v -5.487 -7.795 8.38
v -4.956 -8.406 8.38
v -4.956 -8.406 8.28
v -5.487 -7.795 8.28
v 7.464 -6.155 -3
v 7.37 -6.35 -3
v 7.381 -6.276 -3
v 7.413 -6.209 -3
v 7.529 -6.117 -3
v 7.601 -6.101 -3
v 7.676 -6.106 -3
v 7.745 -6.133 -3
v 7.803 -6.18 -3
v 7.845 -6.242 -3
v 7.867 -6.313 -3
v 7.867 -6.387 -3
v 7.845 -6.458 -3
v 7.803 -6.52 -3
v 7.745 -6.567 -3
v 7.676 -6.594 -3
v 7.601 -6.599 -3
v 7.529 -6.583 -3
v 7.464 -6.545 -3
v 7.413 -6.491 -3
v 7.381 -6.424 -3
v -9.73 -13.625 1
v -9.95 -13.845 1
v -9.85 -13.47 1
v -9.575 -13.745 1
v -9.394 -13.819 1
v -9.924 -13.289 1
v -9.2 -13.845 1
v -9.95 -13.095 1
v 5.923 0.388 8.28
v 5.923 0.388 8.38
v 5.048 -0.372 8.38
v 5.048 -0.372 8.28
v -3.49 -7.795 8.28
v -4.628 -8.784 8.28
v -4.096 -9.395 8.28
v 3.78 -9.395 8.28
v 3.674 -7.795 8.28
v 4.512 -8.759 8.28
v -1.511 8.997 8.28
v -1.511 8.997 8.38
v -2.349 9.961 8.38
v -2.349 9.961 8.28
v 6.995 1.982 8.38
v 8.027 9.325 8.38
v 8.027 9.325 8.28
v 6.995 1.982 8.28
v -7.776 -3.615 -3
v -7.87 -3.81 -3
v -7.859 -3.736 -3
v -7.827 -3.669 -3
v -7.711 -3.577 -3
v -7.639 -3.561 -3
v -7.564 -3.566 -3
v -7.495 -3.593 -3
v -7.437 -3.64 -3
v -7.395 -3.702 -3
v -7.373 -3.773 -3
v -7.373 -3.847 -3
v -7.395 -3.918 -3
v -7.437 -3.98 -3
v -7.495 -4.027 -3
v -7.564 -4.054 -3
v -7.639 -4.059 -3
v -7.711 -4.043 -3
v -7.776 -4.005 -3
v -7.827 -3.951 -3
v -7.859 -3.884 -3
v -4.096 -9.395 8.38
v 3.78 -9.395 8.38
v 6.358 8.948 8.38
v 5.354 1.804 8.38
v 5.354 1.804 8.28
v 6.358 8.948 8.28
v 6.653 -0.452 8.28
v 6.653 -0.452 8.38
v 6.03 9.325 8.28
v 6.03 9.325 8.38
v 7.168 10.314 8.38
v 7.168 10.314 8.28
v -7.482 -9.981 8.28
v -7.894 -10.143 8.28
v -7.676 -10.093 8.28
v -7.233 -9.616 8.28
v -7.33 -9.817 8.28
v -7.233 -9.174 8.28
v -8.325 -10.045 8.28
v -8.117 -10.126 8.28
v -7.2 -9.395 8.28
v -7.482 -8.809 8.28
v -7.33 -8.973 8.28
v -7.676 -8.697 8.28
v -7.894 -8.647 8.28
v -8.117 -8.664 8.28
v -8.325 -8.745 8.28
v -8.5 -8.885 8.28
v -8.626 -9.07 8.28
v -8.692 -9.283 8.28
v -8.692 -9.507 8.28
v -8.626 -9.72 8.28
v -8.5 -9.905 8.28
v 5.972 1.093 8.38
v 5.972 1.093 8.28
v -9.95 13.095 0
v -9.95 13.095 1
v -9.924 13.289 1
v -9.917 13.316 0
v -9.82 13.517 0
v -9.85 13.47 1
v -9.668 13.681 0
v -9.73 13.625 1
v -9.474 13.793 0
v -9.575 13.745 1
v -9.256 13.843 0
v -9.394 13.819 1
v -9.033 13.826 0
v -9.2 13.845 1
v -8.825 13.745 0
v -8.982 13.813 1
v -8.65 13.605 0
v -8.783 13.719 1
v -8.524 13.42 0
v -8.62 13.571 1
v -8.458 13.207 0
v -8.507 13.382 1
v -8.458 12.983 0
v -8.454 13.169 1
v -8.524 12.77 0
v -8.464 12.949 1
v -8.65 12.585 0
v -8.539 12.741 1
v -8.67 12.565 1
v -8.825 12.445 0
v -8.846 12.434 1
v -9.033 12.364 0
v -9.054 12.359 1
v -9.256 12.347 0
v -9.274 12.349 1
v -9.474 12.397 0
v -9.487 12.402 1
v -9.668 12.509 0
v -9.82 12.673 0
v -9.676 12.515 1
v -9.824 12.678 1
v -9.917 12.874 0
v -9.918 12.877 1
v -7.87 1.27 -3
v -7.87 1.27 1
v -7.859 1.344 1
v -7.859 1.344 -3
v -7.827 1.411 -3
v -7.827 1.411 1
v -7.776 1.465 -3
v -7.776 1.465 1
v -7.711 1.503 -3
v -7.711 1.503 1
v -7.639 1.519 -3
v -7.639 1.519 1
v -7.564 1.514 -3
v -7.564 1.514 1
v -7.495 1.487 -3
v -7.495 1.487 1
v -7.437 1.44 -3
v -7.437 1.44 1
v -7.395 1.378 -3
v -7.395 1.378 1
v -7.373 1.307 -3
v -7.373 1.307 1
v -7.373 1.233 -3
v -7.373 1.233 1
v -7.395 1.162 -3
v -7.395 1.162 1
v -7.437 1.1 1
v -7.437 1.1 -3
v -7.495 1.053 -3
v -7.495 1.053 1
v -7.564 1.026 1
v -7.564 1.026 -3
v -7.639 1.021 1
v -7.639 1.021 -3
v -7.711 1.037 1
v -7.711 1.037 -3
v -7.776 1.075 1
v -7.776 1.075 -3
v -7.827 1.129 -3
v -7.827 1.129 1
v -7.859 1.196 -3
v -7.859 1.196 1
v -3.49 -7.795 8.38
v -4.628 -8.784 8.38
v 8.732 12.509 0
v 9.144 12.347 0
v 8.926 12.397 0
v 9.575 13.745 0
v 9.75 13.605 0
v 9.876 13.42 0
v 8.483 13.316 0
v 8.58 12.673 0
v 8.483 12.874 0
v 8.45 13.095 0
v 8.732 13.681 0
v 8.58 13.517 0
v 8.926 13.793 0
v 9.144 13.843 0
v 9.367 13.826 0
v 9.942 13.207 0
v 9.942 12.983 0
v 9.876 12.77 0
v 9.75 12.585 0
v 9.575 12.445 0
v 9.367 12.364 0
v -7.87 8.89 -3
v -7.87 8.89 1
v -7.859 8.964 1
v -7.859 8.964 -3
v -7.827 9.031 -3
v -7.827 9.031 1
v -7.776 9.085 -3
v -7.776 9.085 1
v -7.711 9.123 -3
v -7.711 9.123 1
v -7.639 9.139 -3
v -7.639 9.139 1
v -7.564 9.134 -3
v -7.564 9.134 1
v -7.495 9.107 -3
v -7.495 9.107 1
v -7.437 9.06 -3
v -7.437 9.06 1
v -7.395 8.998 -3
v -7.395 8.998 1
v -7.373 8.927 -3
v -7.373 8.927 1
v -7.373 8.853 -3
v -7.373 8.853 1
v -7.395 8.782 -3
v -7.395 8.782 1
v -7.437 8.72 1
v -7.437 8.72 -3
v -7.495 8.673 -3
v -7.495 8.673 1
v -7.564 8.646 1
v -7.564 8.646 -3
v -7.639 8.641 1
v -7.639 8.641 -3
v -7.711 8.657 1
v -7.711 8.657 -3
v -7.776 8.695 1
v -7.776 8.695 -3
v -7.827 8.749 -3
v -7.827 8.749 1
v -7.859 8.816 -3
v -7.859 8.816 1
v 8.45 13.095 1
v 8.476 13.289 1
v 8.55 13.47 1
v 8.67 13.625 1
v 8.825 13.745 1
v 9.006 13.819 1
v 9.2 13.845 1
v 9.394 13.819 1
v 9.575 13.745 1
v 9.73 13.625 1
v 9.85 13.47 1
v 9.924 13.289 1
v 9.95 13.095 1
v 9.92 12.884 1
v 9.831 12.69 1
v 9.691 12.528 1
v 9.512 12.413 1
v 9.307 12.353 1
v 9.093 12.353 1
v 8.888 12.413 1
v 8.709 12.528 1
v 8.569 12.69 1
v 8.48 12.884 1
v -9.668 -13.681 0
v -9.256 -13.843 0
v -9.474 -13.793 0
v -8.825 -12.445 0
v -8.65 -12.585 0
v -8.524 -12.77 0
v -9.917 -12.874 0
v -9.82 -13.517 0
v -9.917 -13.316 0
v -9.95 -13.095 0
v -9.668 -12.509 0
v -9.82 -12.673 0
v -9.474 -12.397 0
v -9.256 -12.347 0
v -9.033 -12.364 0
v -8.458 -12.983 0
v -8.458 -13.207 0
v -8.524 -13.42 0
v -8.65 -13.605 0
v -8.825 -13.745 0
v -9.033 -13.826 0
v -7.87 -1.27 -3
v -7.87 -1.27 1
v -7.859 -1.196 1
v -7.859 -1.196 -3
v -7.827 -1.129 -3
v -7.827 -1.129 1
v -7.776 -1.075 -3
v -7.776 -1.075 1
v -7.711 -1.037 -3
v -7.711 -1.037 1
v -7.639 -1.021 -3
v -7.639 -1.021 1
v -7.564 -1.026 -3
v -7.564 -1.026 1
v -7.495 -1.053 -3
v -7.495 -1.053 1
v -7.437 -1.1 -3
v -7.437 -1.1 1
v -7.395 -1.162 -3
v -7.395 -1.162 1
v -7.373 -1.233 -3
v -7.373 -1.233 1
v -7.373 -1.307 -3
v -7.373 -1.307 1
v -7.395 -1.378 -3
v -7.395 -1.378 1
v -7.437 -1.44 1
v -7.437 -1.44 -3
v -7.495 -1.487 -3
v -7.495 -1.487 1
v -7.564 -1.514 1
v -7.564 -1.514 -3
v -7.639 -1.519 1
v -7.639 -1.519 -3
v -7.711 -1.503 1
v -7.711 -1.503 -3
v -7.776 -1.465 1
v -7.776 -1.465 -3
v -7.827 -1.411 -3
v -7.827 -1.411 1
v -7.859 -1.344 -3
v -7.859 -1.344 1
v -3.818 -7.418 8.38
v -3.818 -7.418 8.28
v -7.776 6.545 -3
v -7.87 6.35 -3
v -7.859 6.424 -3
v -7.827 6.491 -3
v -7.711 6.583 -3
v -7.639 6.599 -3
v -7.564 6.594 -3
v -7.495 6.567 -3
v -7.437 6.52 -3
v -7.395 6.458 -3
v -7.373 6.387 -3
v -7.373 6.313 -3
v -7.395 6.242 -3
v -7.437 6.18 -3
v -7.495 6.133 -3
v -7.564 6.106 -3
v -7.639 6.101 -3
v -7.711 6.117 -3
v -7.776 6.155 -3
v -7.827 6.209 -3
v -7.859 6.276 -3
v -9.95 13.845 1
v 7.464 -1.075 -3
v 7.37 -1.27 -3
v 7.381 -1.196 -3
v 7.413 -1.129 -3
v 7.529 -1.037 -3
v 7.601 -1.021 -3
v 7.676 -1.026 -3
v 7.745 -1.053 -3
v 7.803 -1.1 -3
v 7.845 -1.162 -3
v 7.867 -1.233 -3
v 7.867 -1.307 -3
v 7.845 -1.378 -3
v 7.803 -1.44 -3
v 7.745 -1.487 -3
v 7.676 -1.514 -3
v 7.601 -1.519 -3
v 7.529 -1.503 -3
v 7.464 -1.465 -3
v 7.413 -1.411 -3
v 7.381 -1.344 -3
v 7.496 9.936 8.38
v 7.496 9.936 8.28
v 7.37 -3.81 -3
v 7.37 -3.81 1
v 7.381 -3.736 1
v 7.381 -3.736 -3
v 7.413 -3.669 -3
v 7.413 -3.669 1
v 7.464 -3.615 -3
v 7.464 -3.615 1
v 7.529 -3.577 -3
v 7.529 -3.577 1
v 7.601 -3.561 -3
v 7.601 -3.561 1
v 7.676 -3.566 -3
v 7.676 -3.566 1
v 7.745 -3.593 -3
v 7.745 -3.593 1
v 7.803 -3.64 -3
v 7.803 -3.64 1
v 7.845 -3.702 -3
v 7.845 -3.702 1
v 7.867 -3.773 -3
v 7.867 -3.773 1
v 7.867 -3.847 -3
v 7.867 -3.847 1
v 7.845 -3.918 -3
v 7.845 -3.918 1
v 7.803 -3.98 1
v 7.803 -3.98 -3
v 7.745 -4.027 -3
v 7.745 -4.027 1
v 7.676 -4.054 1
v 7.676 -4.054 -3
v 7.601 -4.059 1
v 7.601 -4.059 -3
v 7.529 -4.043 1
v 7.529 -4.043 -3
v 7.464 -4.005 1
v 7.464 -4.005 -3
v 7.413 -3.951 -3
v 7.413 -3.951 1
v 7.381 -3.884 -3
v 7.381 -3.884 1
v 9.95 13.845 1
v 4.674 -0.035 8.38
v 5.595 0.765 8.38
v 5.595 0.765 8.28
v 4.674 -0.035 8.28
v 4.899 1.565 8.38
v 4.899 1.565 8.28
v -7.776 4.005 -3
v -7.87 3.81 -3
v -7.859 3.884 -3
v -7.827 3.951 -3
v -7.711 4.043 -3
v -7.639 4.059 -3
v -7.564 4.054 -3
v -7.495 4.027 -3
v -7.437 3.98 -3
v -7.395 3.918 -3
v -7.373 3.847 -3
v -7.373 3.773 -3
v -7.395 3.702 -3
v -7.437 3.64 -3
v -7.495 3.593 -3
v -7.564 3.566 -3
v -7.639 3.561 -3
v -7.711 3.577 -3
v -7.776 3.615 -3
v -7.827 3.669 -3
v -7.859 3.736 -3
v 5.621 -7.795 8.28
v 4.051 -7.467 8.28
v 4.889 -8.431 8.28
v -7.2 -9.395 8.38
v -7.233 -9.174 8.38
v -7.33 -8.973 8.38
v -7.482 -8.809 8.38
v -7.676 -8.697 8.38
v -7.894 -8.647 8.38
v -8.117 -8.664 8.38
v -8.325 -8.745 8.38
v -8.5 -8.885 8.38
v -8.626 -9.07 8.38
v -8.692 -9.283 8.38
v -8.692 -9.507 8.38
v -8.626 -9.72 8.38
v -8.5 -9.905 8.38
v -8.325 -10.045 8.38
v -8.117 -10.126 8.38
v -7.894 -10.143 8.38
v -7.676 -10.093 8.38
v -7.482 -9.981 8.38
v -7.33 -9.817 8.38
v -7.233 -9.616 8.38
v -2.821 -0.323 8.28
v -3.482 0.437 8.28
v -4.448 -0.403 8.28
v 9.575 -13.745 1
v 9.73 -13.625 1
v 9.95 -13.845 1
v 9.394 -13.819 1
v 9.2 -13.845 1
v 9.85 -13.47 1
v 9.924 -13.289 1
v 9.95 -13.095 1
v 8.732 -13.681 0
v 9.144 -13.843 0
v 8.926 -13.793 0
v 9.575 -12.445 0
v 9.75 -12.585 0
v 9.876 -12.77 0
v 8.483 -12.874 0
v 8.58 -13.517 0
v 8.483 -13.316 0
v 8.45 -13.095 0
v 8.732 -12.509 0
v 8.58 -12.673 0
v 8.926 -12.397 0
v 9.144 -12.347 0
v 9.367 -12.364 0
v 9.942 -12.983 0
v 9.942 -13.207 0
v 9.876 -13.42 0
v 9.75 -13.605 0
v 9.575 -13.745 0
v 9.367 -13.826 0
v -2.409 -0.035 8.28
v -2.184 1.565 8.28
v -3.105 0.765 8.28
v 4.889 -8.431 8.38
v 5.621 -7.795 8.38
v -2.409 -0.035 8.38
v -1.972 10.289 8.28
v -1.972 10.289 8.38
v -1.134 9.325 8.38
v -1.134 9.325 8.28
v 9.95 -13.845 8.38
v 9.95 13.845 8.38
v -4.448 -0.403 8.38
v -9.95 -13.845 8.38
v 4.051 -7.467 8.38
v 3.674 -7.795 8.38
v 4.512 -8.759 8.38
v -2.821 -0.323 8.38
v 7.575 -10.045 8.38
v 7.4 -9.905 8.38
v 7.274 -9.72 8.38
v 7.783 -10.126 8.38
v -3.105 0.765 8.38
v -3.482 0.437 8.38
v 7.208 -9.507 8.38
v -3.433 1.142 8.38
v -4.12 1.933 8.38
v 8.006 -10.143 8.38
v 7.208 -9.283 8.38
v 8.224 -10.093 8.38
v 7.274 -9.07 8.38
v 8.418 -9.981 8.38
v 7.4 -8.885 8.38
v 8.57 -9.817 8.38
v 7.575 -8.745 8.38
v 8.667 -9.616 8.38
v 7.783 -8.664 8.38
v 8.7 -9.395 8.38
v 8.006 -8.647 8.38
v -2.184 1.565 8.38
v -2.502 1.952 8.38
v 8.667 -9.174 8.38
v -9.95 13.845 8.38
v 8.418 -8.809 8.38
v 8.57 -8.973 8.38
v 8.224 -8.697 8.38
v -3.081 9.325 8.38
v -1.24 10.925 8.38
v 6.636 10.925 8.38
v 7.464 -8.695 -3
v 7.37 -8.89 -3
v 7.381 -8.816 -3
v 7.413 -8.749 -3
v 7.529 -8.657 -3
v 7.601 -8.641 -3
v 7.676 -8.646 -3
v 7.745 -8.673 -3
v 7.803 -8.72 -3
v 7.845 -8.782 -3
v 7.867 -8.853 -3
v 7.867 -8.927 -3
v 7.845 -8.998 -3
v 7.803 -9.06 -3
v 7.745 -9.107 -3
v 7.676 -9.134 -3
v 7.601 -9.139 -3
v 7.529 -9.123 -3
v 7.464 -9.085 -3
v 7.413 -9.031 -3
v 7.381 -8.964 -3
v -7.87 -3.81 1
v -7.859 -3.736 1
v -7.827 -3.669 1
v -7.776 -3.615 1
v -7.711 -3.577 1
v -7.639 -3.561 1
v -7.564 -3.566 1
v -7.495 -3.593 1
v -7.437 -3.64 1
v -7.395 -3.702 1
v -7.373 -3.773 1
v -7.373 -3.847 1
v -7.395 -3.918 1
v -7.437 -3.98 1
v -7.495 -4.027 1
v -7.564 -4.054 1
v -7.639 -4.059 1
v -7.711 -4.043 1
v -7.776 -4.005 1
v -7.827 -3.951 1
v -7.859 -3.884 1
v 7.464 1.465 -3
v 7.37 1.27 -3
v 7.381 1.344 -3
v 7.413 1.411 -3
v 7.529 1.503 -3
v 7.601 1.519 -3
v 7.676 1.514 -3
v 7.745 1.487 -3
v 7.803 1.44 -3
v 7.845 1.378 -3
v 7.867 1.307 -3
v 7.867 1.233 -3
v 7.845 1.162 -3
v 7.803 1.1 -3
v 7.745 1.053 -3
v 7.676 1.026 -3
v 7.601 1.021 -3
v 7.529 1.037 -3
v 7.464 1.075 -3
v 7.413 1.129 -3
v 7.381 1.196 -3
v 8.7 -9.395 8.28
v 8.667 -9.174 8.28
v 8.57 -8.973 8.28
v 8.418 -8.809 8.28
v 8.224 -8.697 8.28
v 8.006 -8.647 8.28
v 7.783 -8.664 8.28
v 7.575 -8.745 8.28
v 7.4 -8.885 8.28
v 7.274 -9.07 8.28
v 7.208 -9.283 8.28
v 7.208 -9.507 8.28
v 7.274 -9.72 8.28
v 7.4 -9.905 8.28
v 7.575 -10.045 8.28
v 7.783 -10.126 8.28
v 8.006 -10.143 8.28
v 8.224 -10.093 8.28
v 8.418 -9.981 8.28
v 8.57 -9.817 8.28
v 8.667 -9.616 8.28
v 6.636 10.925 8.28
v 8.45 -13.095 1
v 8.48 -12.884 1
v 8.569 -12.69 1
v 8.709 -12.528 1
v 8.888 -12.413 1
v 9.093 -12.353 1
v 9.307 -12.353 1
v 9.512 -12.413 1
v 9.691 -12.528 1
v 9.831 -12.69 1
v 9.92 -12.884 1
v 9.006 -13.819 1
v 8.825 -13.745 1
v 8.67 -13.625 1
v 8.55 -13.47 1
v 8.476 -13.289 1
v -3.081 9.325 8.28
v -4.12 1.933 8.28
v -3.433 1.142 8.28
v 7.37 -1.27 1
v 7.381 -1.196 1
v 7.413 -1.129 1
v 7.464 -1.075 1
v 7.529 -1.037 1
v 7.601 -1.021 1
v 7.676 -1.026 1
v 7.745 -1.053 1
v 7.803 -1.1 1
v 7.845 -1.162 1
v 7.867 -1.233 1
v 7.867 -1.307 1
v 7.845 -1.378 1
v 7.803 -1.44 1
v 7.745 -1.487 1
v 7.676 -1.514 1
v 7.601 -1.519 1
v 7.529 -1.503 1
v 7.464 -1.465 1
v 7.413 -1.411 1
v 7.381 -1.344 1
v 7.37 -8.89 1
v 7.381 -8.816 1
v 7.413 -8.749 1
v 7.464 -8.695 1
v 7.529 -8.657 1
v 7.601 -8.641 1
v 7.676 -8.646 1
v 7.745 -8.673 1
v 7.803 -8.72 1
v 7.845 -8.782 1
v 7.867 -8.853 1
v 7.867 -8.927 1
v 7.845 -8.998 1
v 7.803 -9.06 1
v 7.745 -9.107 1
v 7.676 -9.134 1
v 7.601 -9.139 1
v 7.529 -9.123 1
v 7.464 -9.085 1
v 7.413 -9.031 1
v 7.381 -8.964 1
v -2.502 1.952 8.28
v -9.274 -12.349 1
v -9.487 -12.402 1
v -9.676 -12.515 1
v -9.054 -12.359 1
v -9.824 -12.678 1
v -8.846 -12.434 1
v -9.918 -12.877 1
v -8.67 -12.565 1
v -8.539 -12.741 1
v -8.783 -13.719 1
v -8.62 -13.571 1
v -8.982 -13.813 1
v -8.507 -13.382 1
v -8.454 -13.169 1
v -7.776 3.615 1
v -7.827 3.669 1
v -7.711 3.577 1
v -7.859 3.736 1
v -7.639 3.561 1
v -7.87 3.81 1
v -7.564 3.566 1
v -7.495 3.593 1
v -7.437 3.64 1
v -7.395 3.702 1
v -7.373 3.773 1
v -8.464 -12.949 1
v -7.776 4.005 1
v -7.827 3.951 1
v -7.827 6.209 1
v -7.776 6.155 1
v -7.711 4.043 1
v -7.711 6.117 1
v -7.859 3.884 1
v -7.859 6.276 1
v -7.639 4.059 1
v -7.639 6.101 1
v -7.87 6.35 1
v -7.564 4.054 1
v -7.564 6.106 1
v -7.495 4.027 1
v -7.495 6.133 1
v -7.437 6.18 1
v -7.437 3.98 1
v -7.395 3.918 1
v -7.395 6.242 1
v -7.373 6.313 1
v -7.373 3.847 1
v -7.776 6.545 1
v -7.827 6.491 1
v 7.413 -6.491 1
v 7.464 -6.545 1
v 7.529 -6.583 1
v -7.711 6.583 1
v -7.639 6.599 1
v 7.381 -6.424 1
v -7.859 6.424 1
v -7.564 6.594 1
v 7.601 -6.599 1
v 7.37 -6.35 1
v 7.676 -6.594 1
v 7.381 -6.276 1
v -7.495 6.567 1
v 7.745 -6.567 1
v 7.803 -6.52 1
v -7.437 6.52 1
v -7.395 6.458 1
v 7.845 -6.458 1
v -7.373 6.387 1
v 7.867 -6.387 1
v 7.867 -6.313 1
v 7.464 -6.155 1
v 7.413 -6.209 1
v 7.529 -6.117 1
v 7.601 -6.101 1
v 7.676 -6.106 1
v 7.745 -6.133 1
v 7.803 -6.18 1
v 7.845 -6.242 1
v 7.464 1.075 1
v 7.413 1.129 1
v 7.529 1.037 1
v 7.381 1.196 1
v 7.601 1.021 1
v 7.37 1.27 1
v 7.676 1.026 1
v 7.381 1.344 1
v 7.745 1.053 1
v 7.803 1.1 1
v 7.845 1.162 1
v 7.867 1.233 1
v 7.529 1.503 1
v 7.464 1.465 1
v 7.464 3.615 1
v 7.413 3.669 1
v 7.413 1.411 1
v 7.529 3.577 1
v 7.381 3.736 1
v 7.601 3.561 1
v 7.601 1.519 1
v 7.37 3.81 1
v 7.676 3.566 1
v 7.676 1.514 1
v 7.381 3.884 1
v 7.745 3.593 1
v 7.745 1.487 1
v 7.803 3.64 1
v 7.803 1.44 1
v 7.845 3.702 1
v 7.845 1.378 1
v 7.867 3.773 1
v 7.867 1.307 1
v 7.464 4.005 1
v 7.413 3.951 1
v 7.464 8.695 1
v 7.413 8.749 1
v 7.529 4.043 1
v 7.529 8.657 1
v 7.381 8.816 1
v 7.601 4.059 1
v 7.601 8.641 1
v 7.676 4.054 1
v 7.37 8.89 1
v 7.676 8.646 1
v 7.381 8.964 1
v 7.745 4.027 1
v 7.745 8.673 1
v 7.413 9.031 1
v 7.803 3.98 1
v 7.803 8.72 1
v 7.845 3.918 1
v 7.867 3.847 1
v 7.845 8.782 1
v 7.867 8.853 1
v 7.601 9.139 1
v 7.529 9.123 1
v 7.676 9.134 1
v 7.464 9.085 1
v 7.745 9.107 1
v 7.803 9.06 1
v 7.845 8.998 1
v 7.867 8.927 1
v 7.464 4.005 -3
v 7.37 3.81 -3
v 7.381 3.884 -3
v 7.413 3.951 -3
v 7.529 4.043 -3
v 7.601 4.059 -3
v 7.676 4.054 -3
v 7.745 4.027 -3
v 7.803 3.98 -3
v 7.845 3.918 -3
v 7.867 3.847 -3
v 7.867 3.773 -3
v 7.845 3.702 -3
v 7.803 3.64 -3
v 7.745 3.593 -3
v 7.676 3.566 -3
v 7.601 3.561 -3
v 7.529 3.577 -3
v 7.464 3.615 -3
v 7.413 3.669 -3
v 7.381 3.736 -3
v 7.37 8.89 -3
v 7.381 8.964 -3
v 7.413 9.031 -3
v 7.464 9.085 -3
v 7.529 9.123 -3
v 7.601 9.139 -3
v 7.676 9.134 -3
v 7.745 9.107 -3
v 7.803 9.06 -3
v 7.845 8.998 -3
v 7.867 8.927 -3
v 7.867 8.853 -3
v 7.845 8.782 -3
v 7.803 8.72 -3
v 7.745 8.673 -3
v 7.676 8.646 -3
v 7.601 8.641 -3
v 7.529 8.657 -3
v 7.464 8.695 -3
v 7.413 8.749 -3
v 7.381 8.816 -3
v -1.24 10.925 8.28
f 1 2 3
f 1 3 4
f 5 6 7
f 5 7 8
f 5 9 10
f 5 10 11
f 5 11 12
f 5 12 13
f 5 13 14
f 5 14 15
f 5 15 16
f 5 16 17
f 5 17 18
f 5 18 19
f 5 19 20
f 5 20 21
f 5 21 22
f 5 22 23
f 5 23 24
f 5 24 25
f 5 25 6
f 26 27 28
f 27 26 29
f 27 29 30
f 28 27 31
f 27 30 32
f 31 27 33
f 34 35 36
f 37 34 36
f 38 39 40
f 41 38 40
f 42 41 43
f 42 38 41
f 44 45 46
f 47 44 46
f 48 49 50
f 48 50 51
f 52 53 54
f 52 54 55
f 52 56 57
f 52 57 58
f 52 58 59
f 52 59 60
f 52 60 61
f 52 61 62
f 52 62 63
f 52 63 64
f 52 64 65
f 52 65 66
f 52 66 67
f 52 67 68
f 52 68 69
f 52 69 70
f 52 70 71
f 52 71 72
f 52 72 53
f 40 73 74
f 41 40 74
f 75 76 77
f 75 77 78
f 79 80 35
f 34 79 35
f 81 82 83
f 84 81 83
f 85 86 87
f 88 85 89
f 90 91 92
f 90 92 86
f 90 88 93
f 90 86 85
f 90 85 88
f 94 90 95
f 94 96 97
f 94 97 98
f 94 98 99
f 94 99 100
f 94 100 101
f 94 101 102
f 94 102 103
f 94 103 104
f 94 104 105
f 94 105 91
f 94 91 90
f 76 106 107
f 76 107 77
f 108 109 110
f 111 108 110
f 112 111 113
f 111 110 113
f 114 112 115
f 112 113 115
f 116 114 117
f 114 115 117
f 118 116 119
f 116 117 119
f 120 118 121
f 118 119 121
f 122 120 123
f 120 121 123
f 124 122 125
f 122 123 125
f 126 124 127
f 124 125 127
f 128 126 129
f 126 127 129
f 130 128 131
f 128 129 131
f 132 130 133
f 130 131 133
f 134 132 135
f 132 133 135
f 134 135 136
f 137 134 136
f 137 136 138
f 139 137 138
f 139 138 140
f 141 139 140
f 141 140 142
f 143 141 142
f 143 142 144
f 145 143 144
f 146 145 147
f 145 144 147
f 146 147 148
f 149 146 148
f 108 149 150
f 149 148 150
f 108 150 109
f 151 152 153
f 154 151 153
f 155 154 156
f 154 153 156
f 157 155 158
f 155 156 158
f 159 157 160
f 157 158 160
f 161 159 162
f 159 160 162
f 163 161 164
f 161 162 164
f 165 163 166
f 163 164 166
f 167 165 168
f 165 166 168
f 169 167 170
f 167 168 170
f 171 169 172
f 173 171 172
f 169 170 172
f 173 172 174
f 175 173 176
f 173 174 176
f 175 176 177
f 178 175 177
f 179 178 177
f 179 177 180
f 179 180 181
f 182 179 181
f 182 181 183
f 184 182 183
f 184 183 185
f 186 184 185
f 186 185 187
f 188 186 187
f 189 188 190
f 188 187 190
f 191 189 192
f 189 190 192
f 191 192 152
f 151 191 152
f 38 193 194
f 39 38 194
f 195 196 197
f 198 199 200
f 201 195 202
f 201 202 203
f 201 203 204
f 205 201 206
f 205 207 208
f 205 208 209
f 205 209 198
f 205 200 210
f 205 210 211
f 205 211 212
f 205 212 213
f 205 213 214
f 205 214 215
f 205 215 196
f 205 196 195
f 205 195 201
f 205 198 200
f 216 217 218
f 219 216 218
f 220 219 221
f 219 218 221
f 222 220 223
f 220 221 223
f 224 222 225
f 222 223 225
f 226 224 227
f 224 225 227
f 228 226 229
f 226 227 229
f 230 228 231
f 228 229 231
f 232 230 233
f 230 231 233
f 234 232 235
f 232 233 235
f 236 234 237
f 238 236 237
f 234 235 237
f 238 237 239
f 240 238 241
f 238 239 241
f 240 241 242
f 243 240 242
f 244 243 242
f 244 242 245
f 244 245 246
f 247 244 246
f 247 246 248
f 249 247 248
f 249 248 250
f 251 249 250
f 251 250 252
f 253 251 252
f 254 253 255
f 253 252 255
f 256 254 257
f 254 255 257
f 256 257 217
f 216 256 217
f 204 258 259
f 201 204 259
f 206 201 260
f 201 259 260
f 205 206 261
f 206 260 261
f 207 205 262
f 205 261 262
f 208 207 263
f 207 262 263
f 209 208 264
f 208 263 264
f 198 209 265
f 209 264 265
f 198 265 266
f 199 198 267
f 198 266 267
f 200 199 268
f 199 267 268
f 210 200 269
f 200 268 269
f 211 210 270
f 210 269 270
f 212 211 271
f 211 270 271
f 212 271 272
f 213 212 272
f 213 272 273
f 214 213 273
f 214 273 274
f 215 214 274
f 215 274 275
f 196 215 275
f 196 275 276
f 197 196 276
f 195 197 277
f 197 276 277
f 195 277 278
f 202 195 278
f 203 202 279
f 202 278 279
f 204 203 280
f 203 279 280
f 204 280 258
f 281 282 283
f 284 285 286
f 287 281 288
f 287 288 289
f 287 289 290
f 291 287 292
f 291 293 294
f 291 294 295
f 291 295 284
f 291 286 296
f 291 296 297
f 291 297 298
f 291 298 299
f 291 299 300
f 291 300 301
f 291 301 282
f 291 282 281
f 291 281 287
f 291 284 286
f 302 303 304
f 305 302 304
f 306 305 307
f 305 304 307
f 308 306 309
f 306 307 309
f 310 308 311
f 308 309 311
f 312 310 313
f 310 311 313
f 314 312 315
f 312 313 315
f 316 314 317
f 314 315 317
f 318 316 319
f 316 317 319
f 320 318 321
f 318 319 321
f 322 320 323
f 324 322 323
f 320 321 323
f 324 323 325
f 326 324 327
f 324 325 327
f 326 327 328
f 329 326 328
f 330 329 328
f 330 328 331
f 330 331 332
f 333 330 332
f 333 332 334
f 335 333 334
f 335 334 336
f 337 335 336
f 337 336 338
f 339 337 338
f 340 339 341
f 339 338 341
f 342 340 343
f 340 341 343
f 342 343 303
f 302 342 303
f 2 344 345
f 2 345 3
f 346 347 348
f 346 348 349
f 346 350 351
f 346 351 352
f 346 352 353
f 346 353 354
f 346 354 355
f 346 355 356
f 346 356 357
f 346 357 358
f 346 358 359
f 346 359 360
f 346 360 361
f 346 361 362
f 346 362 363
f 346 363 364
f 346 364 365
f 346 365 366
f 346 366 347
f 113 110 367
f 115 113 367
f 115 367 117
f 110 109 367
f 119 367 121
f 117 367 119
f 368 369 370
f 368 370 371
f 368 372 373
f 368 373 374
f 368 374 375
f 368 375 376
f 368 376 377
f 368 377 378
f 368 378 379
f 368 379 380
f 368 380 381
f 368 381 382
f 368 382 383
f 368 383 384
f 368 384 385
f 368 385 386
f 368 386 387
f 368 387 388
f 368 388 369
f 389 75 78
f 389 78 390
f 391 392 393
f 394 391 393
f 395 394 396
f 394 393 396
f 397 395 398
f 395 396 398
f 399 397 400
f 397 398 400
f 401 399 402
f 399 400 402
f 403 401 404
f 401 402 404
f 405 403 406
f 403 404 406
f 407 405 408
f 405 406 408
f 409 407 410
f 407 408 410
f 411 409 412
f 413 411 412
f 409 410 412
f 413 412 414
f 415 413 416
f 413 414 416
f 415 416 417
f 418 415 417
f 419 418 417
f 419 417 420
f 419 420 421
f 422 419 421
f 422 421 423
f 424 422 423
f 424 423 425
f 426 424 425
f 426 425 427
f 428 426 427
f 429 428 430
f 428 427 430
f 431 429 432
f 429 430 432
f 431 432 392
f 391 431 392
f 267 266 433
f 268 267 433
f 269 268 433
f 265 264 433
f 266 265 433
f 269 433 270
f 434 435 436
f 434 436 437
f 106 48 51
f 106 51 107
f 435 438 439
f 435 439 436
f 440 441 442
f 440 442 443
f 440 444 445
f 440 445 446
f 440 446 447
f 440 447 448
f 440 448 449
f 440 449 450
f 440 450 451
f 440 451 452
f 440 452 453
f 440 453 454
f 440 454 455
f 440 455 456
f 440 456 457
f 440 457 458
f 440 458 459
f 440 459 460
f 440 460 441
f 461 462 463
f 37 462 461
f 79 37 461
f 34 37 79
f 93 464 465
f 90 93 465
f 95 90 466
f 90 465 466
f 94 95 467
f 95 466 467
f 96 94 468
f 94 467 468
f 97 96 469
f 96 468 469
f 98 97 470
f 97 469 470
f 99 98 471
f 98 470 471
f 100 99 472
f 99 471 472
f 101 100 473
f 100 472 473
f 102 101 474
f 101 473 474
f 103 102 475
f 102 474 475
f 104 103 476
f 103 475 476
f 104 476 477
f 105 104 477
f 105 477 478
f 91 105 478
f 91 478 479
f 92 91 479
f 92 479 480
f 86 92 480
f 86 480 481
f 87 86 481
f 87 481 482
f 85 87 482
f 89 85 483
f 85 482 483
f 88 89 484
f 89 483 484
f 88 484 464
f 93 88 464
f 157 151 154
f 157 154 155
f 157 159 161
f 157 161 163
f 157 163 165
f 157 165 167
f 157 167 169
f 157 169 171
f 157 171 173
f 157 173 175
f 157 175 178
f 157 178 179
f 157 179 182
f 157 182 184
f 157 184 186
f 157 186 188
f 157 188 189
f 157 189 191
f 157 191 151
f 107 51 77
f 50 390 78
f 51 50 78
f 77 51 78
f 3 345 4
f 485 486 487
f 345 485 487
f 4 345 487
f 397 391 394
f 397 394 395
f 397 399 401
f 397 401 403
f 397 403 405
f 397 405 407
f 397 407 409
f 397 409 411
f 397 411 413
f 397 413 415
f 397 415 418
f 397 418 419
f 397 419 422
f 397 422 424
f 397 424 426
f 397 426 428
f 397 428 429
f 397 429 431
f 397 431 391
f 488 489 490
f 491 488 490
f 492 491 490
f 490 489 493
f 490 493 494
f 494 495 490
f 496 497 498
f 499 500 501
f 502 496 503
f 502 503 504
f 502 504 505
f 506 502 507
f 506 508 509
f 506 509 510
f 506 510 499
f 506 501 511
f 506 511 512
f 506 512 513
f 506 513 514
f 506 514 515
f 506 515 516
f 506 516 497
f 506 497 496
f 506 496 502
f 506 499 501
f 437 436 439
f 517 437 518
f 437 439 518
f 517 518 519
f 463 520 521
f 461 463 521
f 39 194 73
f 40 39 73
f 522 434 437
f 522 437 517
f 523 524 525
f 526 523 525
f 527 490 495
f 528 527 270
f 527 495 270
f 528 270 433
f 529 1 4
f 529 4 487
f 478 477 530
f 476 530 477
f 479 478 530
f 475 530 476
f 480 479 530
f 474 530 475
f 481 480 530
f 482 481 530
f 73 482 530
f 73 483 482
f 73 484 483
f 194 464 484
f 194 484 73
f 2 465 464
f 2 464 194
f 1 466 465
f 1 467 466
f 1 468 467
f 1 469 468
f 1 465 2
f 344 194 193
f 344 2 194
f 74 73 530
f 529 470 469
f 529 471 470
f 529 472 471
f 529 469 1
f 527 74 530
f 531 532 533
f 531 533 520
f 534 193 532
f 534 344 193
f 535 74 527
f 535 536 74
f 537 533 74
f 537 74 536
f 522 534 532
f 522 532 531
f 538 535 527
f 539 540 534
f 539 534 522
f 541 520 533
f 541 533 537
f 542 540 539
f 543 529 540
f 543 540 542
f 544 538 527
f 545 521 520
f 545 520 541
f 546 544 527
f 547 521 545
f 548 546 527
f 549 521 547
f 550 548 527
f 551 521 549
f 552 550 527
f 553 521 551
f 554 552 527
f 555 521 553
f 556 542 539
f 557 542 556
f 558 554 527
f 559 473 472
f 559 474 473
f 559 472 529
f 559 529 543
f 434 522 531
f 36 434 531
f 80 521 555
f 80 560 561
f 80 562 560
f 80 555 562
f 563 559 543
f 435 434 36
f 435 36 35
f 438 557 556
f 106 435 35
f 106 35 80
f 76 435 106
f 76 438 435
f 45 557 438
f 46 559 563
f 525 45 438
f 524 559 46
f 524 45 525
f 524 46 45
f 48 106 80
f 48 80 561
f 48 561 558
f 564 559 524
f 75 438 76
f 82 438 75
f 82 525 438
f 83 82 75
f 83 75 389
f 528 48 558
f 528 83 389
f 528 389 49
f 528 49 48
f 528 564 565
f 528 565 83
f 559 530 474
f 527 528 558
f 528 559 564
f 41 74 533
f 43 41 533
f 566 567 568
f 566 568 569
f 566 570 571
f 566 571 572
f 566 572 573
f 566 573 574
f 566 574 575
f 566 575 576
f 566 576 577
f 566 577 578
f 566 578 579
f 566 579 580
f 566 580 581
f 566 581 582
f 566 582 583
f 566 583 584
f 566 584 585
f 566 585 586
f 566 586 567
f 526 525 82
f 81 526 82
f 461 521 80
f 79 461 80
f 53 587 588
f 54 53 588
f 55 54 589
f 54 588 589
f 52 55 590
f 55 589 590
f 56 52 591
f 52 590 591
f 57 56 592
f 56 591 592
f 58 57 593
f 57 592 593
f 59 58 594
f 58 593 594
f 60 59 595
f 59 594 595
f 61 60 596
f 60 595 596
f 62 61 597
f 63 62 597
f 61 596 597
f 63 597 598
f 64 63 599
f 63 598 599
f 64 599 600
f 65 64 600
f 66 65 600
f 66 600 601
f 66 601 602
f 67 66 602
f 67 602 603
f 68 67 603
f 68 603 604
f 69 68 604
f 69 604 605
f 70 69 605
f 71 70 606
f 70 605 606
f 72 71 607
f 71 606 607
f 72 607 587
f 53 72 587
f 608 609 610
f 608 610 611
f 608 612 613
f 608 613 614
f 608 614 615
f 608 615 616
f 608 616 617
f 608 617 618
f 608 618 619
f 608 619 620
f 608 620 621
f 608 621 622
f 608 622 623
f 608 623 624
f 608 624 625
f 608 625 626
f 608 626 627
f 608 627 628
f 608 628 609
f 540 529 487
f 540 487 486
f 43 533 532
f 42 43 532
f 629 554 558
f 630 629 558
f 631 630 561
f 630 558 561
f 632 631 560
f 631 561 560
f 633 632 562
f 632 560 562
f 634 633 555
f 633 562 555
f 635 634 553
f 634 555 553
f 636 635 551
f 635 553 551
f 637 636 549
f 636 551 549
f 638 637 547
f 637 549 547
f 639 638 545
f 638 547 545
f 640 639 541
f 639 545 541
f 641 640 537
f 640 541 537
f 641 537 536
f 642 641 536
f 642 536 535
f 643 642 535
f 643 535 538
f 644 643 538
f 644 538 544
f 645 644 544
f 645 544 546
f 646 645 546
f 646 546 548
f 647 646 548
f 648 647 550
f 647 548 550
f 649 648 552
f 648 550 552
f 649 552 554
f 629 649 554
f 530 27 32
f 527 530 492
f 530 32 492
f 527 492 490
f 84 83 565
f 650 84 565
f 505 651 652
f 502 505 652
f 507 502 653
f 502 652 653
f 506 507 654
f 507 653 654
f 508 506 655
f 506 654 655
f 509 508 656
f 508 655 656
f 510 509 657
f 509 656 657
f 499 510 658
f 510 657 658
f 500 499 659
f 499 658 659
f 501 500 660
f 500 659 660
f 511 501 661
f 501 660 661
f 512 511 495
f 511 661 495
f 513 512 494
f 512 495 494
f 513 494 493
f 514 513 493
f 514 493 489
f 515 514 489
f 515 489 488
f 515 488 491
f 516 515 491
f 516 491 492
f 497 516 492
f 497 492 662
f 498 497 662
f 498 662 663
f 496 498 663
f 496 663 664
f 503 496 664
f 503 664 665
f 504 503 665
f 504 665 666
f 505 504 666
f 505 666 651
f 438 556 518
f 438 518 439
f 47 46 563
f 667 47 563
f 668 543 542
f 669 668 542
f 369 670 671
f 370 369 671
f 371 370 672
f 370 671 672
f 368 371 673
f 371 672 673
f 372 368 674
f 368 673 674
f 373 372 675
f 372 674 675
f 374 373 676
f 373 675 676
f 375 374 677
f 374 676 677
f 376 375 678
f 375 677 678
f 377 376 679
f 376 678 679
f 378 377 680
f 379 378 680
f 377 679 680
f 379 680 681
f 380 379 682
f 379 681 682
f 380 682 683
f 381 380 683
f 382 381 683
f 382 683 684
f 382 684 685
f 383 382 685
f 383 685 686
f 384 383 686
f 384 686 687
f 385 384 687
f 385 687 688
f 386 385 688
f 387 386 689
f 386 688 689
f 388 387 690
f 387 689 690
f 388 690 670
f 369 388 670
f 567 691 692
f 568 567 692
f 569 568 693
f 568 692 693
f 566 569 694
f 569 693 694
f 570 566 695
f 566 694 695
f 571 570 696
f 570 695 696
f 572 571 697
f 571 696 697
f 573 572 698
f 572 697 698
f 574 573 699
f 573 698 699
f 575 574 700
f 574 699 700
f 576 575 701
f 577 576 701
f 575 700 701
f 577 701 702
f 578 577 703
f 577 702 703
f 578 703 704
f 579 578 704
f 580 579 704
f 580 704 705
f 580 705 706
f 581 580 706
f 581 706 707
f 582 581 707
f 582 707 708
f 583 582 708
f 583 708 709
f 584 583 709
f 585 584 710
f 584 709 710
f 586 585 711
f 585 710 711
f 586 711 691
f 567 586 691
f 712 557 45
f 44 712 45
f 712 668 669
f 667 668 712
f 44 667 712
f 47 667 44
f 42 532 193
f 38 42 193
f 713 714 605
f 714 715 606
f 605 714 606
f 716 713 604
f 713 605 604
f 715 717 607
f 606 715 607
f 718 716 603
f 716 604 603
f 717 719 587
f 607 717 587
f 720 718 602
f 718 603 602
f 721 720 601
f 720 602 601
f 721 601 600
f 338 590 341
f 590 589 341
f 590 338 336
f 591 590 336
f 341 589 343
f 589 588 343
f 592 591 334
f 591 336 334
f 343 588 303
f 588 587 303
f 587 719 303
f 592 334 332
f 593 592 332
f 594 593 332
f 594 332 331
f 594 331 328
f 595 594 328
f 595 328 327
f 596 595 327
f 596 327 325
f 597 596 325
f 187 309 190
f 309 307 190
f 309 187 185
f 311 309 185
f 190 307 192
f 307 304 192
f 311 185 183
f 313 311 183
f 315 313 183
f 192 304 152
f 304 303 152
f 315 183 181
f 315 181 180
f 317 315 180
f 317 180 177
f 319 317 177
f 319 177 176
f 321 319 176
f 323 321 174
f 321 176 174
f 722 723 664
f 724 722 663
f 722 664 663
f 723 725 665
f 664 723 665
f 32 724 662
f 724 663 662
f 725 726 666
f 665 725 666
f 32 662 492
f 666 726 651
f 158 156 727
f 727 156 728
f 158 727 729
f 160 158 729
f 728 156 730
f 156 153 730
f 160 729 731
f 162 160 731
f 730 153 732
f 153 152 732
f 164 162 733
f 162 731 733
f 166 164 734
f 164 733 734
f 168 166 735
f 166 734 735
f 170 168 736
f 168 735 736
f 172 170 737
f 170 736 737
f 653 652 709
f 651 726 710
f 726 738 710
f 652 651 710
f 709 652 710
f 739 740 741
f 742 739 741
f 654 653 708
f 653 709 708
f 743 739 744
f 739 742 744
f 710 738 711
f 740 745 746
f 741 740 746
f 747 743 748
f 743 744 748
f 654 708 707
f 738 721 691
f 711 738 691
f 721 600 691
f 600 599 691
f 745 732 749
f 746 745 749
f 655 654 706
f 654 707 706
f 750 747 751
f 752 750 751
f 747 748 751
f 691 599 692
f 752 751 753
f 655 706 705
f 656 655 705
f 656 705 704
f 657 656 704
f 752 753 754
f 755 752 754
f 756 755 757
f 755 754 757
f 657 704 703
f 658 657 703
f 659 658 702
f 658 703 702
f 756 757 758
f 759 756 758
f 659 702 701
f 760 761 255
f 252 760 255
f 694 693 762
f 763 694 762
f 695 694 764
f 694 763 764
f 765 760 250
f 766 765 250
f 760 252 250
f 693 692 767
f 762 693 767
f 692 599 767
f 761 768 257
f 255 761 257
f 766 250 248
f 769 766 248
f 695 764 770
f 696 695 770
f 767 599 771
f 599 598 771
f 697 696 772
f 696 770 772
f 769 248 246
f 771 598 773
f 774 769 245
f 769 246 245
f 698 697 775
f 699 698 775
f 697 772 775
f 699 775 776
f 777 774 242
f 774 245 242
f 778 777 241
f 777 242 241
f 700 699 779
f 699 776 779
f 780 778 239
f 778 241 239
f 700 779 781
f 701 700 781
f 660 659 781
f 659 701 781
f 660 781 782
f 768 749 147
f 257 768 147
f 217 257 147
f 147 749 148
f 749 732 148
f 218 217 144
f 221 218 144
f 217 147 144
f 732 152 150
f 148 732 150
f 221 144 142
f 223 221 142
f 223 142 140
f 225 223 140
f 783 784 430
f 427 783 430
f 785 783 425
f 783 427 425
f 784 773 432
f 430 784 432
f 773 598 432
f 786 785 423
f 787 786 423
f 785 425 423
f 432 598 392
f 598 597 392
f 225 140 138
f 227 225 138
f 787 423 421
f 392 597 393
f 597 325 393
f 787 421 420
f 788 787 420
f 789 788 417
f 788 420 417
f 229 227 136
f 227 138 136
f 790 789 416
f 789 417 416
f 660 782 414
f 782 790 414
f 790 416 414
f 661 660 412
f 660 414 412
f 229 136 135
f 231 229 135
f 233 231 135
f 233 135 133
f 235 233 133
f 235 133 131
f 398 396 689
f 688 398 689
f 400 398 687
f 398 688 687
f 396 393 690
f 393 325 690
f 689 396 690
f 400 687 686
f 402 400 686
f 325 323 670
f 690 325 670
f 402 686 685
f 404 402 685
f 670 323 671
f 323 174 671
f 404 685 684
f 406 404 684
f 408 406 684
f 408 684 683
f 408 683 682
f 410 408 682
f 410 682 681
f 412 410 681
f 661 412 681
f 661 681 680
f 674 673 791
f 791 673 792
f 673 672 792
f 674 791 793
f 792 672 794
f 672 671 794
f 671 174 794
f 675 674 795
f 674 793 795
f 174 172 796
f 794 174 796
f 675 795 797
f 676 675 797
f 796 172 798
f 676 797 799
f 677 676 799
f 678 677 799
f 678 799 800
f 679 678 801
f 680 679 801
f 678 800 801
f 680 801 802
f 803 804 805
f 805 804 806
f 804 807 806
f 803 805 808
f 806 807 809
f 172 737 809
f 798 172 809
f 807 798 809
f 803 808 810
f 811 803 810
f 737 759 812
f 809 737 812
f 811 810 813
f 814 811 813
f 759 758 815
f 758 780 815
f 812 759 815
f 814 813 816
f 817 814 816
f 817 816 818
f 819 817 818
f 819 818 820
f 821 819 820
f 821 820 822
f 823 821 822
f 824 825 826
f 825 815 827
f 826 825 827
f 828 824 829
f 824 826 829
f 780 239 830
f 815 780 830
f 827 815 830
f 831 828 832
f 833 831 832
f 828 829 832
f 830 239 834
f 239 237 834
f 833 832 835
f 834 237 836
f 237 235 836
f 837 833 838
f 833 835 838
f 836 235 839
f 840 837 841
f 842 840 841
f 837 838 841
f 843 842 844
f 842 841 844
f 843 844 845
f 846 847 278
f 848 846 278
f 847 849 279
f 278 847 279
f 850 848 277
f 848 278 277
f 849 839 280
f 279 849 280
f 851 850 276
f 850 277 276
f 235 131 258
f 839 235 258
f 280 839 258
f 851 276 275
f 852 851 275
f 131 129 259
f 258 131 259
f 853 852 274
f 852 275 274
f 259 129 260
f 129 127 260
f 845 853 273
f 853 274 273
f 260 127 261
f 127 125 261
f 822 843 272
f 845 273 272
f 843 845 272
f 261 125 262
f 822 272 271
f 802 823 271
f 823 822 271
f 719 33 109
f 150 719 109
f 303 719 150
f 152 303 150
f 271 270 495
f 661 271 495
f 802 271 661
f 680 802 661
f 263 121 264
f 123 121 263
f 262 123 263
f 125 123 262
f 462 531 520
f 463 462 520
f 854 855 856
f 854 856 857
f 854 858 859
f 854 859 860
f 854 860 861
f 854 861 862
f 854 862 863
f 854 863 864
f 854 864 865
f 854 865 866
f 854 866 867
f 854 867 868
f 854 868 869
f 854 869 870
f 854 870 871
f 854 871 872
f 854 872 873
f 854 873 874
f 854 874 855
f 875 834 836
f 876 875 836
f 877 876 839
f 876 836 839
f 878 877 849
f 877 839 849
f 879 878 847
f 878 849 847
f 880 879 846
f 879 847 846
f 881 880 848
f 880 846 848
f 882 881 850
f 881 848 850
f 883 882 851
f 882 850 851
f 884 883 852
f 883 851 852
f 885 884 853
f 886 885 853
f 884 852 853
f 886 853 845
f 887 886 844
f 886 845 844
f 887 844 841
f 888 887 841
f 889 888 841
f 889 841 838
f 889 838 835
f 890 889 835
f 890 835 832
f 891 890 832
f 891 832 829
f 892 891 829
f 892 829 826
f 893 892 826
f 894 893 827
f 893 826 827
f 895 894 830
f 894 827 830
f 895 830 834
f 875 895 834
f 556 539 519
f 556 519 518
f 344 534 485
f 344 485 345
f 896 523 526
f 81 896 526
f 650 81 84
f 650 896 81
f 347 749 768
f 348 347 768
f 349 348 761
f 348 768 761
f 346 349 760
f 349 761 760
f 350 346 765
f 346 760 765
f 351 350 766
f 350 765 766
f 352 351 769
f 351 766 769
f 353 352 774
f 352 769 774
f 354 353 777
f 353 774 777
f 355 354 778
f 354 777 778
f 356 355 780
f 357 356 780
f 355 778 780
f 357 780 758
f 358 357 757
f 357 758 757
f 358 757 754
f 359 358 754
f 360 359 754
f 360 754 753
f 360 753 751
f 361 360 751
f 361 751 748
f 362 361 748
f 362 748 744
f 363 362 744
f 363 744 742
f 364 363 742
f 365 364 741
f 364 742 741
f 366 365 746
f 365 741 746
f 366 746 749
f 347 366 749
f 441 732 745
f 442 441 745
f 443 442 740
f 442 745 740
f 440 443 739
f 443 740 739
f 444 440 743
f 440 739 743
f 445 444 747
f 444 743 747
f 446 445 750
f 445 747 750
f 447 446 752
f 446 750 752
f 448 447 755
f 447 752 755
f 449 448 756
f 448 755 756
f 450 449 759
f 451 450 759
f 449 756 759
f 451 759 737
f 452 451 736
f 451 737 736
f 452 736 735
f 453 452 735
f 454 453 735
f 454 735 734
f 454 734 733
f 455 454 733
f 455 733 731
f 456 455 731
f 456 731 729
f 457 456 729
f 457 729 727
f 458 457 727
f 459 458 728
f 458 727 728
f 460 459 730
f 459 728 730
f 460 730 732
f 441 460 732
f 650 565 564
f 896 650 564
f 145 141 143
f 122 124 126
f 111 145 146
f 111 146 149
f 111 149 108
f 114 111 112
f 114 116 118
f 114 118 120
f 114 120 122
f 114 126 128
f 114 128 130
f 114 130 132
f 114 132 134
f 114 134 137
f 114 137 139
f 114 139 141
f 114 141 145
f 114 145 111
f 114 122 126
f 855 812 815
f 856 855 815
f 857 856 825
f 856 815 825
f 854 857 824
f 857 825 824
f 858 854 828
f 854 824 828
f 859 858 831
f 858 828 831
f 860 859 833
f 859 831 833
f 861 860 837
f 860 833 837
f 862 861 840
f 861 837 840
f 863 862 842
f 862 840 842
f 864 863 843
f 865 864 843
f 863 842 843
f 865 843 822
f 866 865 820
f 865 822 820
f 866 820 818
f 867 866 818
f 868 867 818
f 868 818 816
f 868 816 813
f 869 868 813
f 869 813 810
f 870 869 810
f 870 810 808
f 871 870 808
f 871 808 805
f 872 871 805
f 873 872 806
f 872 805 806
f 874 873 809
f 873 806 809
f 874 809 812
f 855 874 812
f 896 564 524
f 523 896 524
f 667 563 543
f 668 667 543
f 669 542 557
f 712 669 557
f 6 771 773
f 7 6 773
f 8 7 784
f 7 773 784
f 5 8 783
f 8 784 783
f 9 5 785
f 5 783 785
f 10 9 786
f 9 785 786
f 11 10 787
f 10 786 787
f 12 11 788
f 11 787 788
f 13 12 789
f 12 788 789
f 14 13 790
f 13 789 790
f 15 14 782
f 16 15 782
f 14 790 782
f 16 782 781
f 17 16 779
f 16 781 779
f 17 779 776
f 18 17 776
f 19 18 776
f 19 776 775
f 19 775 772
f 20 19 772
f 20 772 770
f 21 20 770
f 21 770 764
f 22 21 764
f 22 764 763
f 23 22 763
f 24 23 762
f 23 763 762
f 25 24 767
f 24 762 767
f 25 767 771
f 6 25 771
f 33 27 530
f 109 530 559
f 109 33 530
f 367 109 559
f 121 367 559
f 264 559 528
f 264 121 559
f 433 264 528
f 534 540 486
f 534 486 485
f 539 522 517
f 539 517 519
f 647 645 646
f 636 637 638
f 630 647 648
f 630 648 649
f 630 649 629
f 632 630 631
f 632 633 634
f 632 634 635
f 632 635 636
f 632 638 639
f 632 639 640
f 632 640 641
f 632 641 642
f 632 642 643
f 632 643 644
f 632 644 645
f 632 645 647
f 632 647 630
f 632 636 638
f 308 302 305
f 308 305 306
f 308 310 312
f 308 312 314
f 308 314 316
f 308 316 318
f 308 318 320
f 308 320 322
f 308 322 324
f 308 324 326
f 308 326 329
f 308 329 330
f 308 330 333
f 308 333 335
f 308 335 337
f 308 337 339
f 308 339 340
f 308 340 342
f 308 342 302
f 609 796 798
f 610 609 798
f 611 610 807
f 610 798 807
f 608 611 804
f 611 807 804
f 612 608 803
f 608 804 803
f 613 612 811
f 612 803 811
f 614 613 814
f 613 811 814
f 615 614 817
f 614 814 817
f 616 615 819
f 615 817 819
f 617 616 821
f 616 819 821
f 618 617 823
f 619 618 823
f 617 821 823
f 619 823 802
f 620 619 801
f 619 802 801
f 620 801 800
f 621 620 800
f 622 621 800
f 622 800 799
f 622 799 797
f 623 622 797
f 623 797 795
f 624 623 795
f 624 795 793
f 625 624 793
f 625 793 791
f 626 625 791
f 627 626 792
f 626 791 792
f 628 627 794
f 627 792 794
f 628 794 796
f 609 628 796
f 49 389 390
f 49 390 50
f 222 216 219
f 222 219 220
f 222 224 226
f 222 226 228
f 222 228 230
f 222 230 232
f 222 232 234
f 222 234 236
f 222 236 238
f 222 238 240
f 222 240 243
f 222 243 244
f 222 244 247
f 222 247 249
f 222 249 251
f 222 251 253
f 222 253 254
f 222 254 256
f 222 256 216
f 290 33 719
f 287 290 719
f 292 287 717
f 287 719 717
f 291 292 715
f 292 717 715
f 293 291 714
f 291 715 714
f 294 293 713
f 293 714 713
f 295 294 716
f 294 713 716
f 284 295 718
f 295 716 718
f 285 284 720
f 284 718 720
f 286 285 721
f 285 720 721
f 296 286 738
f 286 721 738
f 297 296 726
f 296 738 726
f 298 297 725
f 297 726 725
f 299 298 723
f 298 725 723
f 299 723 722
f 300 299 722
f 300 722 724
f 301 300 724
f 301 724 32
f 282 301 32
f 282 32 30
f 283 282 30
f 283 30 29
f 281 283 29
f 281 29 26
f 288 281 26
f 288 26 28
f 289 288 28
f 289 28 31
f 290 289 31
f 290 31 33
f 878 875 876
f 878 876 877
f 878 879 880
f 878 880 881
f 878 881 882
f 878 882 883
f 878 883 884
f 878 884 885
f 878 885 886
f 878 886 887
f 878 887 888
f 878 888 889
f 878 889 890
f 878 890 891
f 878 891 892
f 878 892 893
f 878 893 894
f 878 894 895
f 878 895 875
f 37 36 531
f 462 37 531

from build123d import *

# Parameters (mm, degrees)
EXTRUDE_START       = 1
SKETCH_1_W          = 19.9
SKETCH_1_H          = 27.69
EXTRUDE_1_DEPTH     = 7.38
SKETCH_3_R          = 0.75
EXTRUDE_3_DEPTH     = 1
SKETCH_2_R          = 0.25
EXTRUDE_2_DEPTH     = 4
SKETCH_4_R          = 0.75
CUT_EXTRUDE_1_DEPTH = 0.1


with BuildPart() as part:
    # Эскиз1 → Бобышка-Вытянуть1 (new body)
    with BuildSketch(Plane.XY.offset(EXTRUDE_START)):
        Rectangle(SKETCH_1_W, SKETCH_1_H)
    extrude(amount=EXTRUDE_1_DEPTH)

    # Эскиз3 → Бобышка-Вытянуть3 (add)
    with BuildSketch(Plane(origin=(0, 0, 1), x_dir=(-1, 0, 0), z_dir=(0, 0, -1))):
        with Locations((-9.2, 13.095)):
            Circle(SKETCH_3_R)
        with Locations((9.2, 13.095)):
            Circle(SKETCH_3_R)
        with Locations((9.2, -13.095)):
            Circle(SKETCH_3_R)
        with Locations((-9.2, -13.095)):
            Circle(SKETCH_3_R)
    extrude(amount=EXTRUDE_3_DEPTH)

    # Эскиз2 → Бобышка-Вытянуть2 (add)
    with BuildSketch(Plane(origin=(0, 0, 1), x_dir=(-1, 0, 0), z_dir=(0, 0, -1))):
        with Locations((-7.62, -8.89)):
            Circle(SKETCH_2_R)
        with Locations((7.62, -3.81)):
            Circle(SKETCH_2_R)
        with Locations((7.62, -1.27)):
            Circle(SKETCH_2_R)
        with Locations((7.62, 1.27)):
            Circle(SKETCH_2_R)
        with Locations((7.62, 3.81)):
            Circle(SKETCH_2_R)
        with Locations((7.62, 6.35)):
            Circle(SKETCH_2_R)
        with Locations((7.62, 8.89)):
            Circle(SKETCH_2_R)
        with Locations((-7.62, -6.35)):
            Circle(SKETCH_2_R)
        with Locations((-7.62, -3.81)):
            Circle(SKETCH_2_R)
        with Locations((-7.62, -1.27)):
            Circle(SKETCH_2_R)
        with Locations((-7.62, 1.27)):
            Circle(SKETCH_2_R)
        with Locations((-7.62, 3.81)):
            Circle(SKETCH_2_R)
        with Locations((-7.62, 8.89)):
            Circle(SKETCH_2_R)
    extrude(amount=EXTRUDE_2_DEPTH)

    # Эскиз4 → Вырез-Вытянуть1 (cut)
    with BuildSketch(Plane.XY.offset(8.38)):
        with Locations((-7.95, -9.395)):
            Circle(SKETCH_4_R)
        with Locations((7.95, -9.395)):
            Circle(SKETCH_4_R)
        Polygon((-3.10454324, 0.765), (-2.184248514, 1.565), (4.899303826, 1.565), (5.594733216, 0.765), (4.67443849, -0.035), (-2.409113849, -0.035), align=None)
        Polygon((-4.096222413, -9.395), (3.780432652, -9.395), (4.512049983, -8.759014757), (3.674044739, -7.795), (-3.490293806, -7.795), (-4.627637046, -8.783677395), align=None)
        Polygon((5.048482741, -0.37235479), (4.05139953, -7.466970486), (4.889404773, -8.430985243), (5.621022104, -7.795), (6.652963591, -0.45235479), (5.922762731, 0.38764521), align=None)
        Polygon((-4.119895806, 1.933029514), (-3.432572754, 1.14235479), (-2.501550526, 1.951680066), (-1.51139953, 8.996970486), (-2.349404773, 9.960985243), (-3.081022104, 9.325), align=None)
        Polygon((-4.448207492, -0.403029514), (-3.48189803, 0.436970486), (-2.821240109, -0.323029514), (-3.818323321, -7.41764521), (-4.955666561, -8.406322605), (-5.487081194, -7.795), align=None)
        Polygon((-1.240432652, 10.925), (-1.972049983, 10.289014757), (-1.134044739, 9.325), (6.030293806, 9.325), (7.167637046, 10.313677395), (6.636222413, 10.925), align=None)
        Polygon((6.358323321, 8.94764521), (7.495666561, 9.936322605), (8.027081194, 9.325), (6.995139707, 1.98235479), (5.972088006, 1.093029514), (5.354307894, 1.803704239), align=None)
    extrude(amount=-CUT_EXTRUDE_1_DEPTH, mode=Mode.SUBTRACT)


solid = part.part
